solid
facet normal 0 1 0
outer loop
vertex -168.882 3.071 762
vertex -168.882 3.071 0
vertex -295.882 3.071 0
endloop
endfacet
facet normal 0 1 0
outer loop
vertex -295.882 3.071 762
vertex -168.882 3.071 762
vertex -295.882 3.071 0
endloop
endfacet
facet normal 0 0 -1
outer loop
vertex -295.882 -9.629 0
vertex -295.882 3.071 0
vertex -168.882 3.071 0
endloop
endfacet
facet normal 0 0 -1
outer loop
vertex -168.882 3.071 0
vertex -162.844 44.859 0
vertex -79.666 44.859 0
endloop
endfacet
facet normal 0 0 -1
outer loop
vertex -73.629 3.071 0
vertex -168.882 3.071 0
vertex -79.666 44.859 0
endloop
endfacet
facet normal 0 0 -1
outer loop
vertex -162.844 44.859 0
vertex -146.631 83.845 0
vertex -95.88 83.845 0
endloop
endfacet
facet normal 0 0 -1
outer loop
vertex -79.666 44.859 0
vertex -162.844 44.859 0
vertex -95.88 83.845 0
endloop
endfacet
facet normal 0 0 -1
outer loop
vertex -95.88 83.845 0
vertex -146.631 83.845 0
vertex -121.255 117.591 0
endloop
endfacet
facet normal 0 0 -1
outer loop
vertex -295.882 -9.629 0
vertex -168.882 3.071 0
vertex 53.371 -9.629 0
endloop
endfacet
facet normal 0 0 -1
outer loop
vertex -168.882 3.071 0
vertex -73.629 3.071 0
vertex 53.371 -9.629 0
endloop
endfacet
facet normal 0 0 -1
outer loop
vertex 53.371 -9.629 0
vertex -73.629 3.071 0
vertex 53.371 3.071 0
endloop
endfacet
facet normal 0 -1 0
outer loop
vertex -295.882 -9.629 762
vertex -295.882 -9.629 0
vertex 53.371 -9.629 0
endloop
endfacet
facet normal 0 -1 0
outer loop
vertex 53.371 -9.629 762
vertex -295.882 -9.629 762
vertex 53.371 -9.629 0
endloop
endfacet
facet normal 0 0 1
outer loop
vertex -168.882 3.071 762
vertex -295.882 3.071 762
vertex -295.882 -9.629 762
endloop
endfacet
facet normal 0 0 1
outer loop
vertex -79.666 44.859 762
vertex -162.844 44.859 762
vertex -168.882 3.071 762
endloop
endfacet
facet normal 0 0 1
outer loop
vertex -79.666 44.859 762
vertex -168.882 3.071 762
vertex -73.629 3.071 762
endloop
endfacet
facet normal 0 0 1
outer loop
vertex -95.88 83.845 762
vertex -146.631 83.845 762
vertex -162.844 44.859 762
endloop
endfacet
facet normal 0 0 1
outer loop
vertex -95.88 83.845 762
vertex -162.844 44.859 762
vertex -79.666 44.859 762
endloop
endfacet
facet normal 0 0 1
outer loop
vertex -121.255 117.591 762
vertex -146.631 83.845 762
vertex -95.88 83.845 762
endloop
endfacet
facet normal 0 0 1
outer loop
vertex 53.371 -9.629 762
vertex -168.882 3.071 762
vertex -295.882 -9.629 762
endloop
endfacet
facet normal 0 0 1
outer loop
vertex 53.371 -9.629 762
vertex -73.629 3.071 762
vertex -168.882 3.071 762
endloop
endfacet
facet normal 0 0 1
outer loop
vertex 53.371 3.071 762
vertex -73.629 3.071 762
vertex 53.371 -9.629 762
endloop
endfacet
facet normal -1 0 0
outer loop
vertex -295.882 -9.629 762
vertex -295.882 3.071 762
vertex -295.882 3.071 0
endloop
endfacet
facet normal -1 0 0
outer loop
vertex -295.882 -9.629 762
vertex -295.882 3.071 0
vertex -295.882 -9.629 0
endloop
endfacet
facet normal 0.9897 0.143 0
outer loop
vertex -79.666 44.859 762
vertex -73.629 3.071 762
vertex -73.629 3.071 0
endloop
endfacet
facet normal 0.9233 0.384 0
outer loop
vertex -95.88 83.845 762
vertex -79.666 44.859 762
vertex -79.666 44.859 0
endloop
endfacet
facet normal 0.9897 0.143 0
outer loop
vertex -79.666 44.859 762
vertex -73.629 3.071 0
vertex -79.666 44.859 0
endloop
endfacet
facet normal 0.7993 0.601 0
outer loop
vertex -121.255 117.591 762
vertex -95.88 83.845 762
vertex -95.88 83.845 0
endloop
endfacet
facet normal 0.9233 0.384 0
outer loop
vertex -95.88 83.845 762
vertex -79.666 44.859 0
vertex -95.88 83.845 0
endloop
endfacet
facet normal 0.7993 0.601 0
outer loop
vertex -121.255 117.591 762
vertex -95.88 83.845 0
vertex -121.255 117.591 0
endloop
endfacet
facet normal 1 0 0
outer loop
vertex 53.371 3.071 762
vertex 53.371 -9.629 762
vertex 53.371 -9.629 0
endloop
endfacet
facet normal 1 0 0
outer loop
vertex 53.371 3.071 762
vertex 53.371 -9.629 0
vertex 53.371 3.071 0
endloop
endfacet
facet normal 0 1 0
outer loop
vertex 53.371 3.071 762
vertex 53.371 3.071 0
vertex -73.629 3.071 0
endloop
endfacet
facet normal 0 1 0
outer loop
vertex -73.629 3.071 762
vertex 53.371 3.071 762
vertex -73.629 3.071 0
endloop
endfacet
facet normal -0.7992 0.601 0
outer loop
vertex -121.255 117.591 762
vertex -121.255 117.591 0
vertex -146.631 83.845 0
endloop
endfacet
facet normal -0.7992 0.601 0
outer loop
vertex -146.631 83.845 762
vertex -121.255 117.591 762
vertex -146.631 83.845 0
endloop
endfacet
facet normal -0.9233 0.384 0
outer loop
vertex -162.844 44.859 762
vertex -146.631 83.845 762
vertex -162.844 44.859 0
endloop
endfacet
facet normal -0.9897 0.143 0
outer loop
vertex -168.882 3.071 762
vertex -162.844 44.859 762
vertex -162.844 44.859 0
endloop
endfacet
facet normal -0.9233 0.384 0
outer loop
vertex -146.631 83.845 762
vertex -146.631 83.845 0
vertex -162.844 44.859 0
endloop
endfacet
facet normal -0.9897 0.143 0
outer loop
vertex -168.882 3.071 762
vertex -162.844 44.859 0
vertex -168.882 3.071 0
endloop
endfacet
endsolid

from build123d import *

# Parameters (mm, degrees)
BOSS_EXTRUDE1_DEPTH = 762


with BuildPart() as part:
    # Sketch2 → Boss-Extrude1 (new body)
    with BuildSketch(Plane.XY):
        with BuildLine():
            Line((-295.882088074, -9.629425512), (-168.882088074, -9.629425512))
            Line((-168.882088074, -9.629425512), (-73.62851045, -9.629425512))
            Line((-73.62851045, -9.629425512), (53.37148955, -9.629425512))
            Line((53.37148955, -9.629425512), (53.37148955, 3.070574488))
            Line((53.37148955, 3.070574488), (-73.62851045, 3.070574488))
            ThreePointArc((-73.62851045, 3.070574488), (-86.550085837, 64.860670535), (-121.255299262, 117.59141338))
            ThreePointArc((-121.255299262, 117.59141338), (-155.960512688, 64.860670535), (-168.882088074, 3.070574488))
            Line((-168.882088074, 3.070574488), (-295.882088074, 3.070574488))
            Line((-295.882088074, 3.070574488), (-295.882088074, -9.629425512))
        make_face()
    extrude(amount=BOSS_EXTRUDE1_DEPTH)


solid = part.part
